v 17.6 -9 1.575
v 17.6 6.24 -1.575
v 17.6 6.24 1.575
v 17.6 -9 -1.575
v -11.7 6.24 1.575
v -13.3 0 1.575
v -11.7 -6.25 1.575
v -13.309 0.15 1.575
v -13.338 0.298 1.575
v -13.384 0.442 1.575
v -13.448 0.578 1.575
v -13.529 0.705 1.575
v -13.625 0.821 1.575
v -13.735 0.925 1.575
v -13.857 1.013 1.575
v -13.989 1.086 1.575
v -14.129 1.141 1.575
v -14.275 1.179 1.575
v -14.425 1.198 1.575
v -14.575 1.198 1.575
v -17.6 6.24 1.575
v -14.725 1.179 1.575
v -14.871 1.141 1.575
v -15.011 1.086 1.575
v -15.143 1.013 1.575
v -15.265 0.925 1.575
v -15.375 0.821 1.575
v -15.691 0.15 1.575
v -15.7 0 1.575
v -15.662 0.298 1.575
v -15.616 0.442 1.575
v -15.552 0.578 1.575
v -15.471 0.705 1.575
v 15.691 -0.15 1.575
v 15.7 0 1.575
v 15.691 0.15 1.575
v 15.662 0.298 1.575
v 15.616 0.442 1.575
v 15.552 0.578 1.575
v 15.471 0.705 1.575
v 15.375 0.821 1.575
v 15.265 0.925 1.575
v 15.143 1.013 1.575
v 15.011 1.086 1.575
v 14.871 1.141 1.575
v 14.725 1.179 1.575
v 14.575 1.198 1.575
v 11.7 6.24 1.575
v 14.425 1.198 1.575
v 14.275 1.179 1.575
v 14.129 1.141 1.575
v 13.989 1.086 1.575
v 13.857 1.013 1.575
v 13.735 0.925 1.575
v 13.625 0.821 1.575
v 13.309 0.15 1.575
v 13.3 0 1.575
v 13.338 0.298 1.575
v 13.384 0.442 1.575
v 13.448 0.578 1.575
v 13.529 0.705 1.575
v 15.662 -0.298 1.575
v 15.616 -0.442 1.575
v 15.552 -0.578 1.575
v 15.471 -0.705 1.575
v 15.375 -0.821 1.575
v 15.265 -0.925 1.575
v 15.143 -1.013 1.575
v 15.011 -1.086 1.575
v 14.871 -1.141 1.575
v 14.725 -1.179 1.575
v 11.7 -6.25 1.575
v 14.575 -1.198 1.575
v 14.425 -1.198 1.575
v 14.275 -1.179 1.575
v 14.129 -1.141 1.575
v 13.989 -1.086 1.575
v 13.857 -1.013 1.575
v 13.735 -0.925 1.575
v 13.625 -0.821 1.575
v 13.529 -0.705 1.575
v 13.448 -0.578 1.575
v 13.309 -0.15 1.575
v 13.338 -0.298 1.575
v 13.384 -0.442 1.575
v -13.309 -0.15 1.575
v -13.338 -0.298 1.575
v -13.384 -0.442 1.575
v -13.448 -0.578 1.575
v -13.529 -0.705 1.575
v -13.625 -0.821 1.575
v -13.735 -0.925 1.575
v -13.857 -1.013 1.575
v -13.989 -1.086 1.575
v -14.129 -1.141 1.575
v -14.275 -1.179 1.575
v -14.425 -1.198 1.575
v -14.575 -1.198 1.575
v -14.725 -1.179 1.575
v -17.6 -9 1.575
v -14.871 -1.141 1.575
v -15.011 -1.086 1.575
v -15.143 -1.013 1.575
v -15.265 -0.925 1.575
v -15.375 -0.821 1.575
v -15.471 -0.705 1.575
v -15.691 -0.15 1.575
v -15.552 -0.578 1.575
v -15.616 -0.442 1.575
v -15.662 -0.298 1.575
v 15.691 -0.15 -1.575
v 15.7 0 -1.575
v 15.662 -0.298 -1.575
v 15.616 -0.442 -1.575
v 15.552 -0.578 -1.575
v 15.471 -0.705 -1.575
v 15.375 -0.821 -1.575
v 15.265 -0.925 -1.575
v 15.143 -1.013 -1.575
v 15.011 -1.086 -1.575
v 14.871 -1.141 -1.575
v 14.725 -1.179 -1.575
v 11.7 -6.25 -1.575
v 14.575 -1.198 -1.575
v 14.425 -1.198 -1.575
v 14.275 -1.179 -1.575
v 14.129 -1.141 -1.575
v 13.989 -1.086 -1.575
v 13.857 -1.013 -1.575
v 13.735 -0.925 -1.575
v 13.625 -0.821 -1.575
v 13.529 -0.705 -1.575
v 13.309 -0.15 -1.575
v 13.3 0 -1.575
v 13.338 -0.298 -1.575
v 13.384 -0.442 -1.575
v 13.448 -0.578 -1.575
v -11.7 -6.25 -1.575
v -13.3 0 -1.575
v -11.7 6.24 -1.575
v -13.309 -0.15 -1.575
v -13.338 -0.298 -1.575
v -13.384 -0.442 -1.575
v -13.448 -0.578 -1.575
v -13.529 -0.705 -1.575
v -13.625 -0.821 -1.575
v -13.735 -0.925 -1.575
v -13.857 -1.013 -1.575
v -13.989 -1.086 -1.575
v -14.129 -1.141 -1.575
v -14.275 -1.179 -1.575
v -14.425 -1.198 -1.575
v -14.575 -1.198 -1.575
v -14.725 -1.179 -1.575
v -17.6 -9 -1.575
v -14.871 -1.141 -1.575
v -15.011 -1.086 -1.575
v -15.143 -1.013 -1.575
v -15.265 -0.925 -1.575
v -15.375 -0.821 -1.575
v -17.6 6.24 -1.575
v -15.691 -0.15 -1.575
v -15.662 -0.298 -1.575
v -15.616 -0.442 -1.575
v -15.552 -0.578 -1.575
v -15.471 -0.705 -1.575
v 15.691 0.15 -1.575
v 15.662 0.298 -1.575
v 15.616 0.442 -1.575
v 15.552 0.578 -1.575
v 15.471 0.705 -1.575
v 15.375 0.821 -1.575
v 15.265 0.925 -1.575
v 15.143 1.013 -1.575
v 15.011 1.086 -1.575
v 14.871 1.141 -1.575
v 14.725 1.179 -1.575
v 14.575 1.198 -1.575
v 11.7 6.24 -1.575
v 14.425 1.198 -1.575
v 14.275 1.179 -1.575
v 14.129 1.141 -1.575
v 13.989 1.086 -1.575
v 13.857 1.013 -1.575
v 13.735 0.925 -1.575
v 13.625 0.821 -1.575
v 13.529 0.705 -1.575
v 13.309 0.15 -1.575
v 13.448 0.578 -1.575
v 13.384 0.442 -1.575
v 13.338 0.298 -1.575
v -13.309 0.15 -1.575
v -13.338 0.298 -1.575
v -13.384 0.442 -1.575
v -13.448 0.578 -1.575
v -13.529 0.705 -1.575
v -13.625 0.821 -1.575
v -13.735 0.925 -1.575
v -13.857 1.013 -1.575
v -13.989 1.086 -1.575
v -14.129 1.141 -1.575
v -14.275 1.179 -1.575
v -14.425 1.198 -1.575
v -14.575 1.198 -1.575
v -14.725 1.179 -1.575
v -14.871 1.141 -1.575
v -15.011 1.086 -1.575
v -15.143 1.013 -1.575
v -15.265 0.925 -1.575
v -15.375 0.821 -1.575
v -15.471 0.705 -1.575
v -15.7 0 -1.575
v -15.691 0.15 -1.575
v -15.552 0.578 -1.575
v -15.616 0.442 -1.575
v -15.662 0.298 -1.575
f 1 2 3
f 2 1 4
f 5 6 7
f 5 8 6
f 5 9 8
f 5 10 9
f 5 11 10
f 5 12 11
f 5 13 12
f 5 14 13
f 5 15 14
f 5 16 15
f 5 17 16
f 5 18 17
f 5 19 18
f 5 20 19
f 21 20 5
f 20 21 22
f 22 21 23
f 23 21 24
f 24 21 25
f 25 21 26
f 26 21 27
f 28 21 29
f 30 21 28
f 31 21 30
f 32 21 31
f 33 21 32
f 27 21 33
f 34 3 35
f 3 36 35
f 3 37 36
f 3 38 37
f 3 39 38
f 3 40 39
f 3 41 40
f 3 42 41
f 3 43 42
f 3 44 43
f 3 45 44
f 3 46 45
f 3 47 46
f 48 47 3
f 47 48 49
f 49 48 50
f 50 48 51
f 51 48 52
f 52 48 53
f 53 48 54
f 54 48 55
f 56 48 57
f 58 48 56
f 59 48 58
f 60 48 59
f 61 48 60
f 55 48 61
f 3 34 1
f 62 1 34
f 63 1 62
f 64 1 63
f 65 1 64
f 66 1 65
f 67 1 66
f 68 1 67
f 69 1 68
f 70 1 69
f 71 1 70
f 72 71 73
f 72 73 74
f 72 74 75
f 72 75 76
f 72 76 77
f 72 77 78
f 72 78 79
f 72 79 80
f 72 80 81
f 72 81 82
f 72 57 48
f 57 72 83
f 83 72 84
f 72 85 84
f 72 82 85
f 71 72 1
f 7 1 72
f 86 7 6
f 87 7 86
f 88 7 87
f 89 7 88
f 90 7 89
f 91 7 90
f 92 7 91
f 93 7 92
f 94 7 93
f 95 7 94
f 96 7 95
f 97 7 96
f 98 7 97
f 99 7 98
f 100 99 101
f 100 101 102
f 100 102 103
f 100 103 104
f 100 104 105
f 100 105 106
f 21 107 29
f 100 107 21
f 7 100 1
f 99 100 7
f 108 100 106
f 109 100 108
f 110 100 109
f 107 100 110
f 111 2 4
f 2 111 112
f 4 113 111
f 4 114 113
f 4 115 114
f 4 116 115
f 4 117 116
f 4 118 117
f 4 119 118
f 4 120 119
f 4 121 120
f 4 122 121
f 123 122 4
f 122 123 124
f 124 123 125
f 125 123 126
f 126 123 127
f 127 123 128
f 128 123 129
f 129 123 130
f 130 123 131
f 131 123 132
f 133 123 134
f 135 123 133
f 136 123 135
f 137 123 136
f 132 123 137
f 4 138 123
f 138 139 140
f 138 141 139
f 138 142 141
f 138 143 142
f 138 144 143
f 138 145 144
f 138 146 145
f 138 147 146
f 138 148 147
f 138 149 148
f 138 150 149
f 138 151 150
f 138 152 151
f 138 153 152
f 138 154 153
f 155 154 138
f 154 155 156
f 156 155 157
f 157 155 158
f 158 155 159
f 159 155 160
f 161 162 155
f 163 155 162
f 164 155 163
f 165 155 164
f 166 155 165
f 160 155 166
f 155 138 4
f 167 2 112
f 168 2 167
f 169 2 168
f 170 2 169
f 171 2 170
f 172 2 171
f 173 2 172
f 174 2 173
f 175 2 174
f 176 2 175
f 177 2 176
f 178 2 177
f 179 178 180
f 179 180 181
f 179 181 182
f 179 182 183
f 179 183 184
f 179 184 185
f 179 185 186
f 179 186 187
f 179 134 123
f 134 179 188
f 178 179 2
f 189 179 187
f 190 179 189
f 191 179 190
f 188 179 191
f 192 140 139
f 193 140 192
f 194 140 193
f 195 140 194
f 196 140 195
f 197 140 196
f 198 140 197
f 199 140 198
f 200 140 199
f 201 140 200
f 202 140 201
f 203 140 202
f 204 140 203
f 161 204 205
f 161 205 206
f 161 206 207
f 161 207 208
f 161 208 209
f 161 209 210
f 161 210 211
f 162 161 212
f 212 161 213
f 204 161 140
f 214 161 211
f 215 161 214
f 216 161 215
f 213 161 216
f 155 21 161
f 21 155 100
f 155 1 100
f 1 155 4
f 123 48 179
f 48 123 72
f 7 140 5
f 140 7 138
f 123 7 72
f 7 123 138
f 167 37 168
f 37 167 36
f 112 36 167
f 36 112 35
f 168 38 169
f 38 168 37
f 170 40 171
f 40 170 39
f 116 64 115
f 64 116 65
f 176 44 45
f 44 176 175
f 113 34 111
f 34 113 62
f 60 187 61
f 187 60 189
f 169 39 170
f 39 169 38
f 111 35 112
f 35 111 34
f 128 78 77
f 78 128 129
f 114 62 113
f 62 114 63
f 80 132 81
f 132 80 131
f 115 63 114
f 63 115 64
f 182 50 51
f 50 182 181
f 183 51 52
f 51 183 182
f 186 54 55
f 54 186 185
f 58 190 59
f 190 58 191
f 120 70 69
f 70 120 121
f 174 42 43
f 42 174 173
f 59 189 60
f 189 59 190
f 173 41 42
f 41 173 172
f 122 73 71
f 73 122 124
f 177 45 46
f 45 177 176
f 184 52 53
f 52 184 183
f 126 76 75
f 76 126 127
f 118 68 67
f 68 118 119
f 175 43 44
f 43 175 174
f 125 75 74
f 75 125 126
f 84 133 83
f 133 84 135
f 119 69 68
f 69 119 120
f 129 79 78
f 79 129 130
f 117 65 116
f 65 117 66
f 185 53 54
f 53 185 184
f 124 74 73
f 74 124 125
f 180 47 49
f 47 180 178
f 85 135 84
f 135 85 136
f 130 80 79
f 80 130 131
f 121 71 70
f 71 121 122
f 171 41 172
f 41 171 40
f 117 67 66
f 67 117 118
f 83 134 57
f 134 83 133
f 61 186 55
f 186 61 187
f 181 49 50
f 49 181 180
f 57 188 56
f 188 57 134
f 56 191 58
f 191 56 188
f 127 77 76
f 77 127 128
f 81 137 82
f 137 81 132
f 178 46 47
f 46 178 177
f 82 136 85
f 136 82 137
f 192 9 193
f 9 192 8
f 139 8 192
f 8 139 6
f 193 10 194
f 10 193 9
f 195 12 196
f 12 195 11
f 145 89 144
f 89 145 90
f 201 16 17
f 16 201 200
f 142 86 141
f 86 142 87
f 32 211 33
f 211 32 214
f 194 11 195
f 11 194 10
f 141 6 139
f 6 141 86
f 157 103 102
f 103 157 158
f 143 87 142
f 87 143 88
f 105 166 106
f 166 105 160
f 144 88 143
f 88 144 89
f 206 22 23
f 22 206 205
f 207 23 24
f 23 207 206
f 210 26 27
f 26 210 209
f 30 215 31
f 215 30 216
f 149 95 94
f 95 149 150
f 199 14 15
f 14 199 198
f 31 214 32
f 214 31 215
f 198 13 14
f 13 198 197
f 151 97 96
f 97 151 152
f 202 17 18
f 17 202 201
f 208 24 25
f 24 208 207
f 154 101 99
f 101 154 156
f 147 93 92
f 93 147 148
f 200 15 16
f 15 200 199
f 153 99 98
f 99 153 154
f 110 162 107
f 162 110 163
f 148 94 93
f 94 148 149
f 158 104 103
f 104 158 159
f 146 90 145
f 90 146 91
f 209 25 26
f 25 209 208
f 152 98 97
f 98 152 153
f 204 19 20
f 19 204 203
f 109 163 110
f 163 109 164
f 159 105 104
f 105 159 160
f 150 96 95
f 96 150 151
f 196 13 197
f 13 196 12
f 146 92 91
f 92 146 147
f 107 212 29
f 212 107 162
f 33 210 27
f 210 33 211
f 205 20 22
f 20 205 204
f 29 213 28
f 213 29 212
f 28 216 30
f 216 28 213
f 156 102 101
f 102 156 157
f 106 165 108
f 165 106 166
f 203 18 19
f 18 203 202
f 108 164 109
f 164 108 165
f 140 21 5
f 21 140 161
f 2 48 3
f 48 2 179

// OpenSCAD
$fn=50;

difference()
{
    cube([35.2,18,3.15],center= true);          //Main body
cube([23.4,12.5,4],center= true);               //Servo cut out
   translate([14.5,0,-2]) cylinder(h=5, r=1.2);   // Screw hole + direction
translate([-14.5,0,-2]) cylinder(h=5, r=1.2);     // Screw hole - direction 
 translate([-20,6.24,-2])cube([40,15,4]);       //Cut off bar  + direction
} 
